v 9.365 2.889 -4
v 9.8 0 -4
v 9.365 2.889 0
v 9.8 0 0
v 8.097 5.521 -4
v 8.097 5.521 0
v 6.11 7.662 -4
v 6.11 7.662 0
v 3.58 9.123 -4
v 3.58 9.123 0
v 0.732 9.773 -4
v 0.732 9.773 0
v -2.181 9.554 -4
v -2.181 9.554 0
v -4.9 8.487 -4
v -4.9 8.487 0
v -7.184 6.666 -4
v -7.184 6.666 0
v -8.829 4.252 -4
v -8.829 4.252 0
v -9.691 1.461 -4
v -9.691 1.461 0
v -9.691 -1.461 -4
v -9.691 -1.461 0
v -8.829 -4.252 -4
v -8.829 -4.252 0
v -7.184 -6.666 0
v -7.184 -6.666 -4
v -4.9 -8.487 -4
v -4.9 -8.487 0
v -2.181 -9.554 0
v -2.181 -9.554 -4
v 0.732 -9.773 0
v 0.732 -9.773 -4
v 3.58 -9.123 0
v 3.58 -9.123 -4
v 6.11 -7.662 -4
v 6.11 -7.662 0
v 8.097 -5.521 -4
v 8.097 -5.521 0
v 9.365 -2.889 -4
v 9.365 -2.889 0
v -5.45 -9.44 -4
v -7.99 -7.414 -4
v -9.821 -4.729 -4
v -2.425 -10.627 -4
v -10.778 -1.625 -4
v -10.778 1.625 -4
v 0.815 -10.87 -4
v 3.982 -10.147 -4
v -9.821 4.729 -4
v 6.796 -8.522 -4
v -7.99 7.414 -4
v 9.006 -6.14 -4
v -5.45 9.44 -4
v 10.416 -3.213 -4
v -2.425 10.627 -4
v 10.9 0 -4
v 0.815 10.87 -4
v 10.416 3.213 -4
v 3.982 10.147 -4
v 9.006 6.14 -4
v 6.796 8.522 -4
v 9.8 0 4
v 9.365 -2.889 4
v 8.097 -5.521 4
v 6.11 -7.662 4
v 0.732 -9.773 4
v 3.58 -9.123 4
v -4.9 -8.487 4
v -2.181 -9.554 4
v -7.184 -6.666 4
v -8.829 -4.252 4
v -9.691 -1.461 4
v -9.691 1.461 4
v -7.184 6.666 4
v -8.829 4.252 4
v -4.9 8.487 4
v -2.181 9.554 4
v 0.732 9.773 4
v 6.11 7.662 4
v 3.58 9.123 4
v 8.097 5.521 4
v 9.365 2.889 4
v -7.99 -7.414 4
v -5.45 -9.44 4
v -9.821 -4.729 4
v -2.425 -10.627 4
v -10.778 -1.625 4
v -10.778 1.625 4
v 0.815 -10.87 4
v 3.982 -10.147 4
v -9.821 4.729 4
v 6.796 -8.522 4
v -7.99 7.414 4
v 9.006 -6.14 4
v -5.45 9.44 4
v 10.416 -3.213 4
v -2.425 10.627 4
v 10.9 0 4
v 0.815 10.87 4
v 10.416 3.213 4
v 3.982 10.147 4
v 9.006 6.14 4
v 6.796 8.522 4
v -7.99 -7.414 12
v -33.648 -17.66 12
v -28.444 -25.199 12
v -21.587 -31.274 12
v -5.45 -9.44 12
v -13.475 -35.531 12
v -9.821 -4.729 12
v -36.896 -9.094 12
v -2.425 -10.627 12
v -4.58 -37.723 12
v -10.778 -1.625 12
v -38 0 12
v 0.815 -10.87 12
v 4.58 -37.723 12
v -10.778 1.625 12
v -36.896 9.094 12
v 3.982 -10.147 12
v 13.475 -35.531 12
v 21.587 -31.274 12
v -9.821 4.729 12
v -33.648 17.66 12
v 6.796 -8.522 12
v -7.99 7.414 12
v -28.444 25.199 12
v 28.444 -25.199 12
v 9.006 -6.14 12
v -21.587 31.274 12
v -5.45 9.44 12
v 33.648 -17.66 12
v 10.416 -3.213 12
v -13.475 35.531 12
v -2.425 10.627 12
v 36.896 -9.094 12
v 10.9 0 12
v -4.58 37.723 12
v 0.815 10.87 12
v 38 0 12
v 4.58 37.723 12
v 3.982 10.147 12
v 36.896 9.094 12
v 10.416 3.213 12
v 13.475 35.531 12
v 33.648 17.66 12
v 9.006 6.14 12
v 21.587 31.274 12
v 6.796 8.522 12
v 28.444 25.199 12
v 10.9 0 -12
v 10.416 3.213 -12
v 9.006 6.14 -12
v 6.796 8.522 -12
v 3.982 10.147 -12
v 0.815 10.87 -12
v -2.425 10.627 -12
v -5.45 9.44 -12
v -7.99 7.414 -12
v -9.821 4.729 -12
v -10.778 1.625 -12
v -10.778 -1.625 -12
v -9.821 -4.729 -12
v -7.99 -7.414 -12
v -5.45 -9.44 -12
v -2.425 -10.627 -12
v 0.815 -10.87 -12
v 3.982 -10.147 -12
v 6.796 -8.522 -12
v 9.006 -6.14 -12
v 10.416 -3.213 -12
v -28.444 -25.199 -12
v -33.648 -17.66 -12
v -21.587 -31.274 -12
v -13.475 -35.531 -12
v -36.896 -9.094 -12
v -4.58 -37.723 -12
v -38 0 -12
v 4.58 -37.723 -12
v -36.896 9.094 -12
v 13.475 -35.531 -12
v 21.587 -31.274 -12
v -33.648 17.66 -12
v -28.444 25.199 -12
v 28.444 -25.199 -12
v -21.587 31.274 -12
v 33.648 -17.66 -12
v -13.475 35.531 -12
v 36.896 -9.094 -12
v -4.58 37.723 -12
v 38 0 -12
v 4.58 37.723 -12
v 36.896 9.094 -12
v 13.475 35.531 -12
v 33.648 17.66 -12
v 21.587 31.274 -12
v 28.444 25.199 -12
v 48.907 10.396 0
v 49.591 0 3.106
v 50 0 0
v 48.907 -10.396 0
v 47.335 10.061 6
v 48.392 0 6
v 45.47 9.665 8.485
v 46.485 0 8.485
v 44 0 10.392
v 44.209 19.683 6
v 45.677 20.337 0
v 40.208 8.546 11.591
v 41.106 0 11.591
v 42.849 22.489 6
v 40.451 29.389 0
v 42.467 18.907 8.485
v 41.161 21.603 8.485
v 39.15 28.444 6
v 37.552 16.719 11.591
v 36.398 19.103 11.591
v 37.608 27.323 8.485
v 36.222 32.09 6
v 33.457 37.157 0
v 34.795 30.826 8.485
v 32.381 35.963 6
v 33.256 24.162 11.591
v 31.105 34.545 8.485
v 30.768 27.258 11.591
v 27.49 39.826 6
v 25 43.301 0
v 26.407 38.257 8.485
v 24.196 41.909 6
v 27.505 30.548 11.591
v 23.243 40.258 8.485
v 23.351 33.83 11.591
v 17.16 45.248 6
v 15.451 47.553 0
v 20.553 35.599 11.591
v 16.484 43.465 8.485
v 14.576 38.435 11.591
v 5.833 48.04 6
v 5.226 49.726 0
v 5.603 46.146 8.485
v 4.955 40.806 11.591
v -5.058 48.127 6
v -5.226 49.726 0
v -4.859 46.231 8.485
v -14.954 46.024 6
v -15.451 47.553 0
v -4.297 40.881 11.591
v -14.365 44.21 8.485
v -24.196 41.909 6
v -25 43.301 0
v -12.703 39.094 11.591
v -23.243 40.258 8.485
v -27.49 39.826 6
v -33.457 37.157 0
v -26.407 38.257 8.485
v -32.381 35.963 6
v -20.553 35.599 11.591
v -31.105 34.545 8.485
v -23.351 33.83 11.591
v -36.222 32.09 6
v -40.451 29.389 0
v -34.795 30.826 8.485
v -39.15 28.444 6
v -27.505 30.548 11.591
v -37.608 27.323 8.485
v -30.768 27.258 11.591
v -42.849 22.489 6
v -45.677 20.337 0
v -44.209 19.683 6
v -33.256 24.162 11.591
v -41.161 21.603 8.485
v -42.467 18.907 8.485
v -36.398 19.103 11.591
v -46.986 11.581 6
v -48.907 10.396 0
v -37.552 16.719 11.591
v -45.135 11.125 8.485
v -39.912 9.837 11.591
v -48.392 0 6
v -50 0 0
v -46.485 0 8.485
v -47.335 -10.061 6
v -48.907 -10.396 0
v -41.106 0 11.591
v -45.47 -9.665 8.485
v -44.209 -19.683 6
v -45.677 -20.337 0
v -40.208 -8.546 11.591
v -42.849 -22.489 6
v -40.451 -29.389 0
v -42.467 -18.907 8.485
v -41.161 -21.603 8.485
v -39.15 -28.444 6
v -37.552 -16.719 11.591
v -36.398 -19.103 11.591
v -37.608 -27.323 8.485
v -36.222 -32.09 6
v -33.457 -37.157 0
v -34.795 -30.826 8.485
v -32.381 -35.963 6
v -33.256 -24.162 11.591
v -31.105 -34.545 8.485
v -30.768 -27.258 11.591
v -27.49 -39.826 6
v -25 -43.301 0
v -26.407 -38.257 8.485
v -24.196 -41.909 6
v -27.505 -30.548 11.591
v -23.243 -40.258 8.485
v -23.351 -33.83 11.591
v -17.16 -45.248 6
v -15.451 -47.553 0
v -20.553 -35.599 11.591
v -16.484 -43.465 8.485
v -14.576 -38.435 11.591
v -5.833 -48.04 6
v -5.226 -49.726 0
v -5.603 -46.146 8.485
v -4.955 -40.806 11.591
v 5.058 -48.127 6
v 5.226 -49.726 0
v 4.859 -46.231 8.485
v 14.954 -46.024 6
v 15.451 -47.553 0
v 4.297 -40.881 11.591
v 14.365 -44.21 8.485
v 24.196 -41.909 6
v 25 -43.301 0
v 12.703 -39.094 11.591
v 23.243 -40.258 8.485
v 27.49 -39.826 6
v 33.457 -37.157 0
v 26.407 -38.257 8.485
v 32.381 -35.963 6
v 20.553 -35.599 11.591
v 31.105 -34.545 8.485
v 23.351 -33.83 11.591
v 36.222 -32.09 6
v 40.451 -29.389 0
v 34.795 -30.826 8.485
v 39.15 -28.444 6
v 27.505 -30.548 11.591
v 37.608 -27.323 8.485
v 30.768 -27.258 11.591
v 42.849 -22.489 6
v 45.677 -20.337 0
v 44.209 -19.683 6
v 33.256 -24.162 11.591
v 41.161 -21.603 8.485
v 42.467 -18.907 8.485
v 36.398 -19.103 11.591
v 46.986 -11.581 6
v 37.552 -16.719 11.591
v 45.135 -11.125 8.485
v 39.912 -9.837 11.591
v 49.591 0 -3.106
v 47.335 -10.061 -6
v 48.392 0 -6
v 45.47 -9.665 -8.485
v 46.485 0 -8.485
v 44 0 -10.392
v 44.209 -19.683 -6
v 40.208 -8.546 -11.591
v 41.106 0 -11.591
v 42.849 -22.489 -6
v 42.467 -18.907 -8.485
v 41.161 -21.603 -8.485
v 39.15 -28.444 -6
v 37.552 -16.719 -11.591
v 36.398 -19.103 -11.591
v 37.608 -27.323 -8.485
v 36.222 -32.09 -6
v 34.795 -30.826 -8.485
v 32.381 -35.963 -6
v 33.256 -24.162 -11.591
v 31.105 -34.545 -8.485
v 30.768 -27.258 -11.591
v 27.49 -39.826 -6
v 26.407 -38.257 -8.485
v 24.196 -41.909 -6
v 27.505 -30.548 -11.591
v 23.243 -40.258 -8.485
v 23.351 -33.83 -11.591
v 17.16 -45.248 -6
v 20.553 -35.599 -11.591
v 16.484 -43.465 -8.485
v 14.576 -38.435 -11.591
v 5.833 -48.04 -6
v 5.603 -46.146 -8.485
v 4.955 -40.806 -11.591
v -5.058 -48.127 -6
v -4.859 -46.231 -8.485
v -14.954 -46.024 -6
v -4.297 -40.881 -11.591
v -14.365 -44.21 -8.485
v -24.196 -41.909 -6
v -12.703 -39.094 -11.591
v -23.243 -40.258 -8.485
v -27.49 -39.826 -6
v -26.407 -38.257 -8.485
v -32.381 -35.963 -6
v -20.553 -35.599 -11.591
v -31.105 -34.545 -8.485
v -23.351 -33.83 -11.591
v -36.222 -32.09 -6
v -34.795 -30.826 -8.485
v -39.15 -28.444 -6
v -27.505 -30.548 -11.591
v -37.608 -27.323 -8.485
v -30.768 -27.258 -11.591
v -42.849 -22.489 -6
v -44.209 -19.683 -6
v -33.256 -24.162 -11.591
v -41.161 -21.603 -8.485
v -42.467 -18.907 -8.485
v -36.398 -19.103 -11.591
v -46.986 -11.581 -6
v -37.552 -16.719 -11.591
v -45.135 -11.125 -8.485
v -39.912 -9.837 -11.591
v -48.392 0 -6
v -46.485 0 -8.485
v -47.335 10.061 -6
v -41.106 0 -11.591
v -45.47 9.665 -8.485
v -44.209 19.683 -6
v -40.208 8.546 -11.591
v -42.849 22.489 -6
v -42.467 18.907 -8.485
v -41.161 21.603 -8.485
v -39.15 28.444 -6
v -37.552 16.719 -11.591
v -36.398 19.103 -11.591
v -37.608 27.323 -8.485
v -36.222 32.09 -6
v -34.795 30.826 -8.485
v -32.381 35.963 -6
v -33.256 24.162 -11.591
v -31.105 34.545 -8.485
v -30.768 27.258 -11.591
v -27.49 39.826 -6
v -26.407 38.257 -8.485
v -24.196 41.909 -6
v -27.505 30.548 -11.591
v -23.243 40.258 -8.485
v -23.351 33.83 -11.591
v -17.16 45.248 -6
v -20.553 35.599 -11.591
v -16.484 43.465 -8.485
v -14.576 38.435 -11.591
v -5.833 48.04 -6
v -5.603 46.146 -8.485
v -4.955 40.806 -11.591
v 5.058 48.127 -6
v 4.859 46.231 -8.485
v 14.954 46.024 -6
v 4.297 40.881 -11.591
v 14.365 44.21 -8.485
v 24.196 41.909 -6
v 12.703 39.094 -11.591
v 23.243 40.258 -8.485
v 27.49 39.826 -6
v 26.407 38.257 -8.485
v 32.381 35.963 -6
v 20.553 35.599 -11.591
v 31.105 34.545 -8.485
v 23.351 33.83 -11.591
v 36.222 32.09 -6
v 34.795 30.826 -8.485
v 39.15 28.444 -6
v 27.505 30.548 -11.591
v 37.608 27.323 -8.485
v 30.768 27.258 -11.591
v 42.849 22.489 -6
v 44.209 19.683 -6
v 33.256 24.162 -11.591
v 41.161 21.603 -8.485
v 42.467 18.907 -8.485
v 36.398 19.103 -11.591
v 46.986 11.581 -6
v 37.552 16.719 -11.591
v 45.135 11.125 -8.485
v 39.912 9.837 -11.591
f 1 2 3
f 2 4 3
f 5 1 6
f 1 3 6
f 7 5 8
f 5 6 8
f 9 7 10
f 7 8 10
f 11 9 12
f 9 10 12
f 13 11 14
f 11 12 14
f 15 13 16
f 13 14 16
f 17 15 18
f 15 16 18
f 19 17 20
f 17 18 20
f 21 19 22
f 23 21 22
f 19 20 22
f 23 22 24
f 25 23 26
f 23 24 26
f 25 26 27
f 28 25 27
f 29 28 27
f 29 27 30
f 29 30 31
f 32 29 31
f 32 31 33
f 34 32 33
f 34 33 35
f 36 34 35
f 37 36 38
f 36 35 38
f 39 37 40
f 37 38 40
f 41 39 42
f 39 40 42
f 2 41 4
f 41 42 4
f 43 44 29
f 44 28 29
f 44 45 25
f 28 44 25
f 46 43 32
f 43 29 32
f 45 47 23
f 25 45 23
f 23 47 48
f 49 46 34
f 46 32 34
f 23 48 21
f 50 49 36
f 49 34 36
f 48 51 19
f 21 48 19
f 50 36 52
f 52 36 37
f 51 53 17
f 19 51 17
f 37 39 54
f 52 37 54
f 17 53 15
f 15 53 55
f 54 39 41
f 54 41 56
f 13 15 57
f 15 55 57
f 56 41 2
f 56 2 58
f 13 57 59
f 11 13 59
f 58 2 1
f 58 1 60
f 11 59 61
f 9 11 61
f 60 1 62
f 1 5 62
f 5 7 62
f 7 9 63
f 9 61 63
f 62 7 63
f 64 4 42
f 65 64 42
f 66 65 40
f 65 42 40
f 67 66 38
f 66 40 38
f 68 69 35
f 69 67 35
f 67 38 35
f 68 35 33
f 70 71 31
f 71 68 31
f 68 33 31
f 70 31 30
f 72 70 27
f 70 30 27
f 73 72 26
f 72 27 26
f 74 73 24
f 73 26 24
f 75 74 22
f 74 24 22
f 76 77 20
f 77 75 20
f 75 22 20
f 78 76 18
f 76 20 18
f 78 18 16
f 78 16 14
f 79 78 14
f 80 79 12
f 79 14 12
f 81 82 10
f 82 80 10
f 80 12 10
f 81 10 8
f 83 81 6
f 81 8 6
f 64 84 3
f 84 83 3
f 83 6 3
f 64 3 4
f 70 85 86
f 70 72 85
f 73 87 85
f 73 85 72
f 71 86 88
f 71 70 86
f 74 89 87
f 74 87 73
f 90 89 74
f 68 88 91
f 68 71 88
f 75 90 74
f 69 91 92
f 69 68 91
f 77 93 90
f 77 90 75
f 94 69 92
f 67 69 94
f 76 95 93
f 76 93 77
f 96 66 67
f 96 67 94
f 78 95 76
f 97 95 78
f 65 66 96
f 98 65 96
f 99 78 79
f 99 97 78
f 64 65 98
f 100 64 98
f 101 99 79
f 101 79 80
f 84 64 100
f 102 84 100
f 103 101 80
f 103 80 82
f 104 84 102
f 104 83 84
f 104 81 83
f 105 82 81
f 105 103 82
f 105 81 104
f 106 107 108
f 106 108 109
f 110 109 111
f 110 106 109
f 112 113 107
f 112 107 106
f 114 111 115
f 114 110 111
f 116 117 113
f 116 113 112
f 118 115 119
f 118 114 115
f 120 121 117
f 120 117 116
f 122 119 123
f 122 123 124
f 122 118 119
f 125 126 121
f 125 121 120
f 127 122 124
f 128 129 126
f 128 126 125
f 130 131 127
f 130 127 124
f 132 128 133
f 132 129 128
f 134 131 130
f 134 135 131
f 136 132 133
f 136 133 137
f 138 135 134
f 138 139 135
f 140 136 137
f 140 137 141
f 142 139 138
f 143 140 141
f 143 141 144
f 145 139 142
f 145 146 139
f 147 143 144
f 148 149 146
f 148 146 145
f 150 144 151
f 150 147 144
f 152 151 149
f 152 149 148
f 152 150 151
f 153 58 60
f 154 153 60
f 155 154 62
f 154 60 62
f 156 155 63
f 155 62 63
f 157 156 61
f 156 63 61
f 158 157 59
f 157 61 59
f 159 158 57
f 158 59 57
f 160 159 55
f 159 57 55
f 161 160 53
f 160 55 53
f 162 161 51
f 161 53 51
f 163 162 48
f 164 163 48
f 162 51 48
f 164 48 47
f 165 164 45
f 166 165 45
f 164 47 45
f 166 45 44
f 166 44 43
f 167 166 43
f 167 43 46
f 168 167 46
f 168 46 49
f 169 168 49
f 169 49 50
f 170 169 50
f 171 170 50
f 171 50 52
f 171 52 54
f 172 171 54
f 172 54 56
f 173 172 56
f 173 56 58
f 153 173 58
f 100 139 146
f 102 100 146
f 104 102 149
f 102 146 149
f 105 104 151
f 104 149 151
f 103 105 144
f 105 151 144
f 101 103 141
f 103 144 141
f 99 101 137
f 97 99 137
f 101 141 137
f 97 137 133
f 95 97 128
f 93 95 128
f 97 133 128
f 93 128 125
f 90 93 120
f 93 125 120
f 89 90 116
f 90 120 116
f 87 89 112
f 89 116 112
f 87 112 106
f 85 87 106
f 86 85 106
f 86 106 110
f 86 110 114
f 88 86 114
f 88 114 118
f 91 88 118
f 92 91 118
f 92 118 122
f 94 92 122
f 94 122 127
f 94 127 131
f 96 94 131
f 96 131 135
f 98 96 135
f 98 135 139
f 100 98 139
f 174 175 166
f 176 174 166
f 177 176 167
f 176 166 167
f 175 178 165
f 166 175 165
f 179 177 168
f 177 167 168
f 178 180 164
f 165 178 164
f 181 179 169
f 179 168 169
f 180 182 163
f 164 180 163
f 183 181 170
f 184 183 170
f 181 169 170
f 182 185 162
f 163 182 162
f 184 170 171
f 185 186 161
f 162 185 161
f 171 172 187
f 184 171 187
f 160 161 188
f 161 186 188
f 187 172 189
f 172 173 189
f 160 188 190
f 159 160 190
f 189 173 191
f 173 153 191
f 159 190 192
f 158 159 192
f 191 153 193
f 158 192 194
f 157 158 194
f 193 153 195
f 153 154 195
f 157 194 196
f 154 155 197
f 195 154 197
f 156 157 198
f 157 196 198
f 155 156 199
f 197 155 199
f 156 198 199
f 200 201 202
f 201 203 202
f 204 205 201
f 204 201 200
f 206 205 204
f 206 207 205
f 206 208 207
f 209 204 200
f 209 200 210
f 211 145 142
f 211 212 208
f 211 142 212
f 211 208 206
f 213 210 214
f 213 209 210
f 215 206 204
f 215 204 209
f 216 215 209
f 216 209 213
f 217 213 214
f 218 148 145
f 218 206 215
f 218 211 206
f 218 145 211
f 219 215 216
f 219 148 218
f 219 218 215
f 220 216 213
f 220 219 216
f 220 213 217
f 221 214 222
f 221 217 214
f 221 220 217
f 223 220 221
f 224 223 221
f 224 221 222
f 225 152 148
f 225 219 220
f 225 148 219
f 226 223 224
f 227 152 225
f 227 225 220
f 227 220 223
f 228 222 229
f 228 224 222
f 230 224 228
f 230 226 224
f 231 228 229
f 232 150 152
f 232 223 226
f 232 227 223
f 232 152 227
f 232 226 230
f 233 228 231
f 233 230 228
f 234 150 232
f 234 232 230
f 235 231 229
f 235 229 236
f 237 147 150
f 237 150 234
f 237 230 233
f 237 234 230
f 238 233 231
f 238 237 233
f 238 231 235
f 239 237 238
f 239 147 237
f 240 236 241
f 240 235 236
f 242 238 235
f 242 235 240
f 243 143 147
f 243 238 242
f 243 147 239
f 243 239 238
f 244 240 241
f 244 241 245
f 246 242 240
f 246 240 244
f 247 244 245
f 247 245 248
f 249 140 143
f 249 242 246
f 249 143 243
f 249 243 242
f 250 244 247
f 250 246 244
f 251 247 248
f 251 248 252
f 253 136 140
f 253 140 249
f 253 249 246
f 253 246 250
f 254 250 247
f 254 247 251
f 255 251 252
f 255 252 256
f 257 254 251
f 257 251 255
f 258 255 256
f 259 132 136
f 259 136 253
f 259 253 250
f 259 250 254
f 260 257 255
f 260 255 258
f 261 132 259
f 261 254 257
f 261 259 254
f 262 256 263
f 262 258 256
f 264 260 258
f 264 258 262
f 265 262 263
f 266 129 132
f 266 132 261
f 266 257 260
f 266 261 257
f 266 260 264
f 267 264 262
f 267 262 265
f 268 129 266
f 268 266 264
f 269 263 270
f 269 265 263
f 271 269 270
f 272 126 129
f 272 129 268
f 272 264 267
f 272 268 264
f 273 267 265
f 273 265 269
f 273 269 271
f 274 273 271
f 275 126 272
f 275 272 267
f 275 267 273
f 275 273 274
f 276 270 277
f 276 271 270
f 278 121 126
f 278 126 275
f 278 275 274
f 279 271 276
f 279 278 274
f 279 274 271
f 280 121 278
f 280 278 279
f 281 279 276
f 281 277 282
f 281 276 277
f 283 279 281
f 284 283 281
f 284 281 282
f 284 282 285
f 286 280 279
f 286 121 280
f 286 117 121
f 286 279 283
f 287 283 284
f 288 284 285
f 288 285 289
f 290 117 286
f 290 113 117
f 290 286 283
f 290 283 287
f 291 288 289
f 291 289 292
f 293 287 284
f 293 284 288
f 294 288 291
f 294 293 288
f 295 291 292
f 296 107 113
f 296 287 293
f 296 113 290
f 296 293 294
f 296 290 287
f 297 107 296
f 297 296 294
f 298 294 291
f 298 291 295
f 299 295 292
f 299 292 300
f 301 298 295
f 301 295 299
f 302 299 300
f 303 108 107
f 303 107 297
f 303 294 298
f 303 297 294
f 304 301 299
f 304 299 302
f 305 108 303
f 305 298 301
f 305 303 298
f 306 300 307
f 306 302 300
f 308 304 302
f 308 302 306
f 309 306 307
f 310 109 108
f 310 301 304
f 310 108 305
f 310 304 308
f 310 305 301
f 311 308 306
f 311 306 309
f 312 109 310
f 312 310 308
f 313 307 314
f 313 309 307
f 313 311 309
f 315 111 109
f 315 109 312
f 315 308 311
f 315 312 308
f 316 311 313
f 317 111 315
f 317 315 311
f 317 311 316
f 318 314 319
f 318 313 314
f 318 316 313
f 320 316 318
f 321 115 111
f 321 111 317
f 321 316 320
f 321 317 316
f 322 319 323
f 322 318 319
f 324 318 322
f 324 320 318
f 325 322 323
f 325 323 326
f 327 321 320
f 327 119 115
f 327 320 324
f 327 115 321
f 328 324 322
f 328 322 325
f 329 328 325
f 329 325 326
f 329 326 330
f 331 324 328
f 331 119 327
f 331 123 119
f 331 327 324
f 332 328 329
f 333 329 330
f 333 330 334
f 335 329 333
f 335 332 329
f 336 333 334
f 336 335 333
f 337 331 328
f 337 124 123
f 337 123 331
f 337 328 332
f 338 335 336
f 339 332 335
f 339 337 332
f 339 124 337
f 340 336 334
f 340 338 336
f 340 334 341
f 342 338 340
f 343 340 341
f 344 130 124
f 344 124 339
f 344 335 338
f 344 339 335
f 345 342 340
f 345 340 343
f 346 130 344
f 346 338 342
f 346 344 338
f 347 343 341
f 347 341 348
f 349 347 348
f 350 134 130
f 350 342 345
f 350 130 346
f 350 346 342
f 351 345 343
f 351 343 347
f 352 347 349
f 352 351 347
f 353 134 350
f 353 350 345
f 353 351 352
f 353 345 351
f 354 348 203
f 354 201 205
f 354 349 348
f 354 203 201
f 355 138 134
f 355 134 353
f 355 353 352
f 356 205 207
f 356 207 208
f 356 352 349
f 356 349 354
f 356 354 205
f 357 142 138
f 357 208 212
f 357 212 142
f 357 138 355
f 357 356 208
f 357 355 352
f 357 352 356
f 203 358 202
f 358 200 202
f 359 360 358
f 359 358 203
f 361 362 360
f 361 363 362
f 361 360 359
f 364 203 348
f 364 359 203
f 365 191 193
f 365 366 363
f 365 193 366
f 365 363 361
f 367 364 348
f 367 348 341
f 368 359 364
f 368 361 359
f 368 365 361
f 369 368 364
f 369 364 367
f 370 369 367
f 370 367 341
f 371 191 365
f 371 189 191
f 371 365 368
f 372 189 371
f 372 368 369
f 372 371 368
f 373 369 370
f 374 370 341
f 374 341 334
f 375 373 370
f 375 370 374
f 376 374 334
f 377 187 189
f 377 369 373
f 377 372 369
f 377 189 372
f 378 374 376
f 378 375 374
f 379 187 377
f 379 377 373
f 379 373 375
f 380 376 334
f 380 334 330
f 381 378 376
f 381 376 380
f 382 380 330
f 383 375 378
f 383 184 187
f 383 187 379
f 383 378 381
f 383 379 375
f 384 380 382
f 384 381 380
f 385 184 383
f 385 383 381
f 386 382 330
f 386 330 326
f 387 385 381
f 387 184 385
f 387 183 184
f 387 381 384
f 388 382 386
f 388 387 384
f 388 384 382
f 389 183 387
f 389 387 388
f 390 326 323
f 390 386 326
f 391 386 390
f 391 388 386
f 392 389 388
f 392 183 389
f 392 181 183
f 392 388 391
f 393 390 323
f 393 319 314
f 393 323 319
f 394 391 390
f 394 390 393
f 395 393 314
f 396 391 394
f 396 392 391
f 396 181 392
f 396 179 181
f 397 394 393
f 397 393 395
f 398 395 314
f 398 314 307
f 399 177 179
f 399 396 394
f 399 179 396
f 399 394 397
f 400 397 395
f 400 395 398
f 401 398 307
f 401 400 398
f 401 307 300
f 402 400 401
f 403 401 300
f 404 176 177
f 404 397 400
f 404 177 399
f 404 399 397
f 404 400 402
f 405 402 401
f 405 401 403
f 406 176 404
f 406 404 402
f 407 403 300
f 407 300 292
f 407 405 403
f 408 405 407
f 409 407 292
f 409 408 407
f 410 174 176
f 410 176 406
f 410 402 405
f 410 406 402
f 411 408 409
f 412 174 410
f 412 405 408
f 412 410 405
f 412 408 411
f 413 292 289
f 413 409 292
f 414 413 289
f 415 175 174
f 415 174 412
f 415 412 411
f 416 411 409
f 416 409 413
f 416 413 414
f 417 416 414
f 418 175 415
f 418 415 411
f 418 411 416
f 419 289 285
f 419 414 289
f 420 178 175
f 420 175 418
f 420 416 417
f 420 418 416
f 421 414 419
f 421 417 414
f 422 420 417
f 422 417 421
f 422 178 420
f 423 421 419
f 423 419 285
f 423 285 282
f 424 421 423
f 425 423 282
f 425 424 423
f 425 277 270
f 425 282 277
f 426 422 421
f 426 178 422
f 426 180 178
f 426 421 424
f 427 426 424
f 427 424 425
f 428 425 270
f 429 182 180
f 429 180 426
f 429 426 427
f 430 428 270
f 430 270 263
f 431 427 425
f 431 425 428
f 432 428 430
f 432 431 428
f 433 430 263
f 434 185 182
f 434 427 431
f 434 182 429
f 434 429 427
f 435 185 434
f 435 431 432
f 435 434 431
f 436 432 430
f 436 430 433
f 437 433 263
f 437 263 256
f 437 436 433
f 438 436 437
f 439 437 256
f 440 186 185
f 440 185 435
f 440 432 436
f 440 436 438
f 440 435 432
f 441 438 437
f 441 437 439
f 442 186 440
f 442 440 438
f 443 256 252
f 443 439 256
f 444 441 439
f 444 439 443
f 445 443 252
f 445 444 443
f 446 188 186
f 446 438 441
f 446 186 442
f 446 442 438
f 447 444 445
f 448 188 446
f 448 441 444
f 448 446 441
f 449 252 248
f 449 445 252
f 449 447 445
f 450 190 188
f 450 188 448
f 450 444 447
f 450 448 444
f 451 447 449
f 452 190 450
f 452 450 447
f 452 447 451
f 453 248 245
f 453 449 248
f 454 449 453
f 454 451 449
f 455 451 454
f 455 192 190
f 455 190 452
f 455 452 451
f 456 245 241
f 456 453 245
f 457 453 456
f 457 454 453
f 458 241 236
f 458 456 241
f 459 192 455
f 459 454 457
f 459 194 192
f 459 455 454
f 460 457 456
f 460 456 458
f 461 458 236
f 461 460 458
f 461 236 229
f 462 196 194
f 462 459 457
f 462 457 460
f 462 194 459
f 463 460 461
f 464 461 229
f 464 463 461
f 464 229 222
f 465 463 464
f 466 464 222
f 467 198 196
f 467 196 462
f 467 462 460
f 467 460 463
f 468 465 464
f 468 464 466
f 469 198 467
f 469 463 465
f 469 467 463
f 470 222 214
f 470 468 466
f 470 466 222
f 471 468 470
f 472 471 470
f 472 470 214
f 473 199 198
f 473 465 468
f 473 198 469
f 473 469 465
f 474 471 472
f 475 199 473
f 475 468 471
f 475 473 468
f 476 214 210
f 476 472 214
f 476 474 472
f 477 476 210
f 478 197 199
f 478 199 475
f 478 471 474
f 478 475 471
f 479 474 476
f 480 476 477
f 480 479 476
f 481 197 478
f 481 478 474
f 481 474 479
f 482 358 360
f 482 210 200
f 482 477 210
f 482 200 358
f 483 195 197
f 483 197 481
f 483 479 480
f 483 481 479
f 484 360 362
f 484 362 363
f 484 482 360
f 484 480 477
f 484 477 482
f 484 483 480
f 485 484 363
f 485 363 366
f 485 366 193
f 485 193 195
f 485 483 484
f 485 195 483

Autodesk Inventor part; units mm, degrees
ref_plane "YZ Plane" through (0, 0, 0) normal (1, 0, 0) x (0, 1, 0)
ref_plane "XZ Plane" through (0, 0, 0) normal (0, 1, 0) x (-1, 0, 0)
ref_plane "XY Plane" through (0, 0, 0) normal (0, 0, 1) x (1, 0, 0)
sketch "Sketch1" plane through (0, 0, 0) normal (0, 0, 1) x (1, 0, 0)
  circle A0 centre (0, 0) radius 50
  dimension "d0" = 100
extrude "Extrusion1" add sketch "Sketch1" along normal mid plane 24
fillet "Fillet1" radius 12 2 edges at (-50, 0, 12) (-50, 0, -12)
sketch "Sketch2" plane through (0, 0, 12) normal (0, 0, 1) x (1, 0, 0)
  point P0 (0, 0)
sketch "Sketch3" plane through (0, 0, 12) normal (0, 0, 1) x (1, 0, 0)
  circle A0 centre (0, 0) radius 10.9
  dimension "d4" = 21.8
extrude "Extrusion2" cut sketch "Sketch3" against normal through all
sketch "Sketch4" plane through (0, 0, 0) normal (0, 0, 1) x (1, 0, 0)
  circle A0 centre (0, 0) radius 9.8
  circle A1 centre (0, 0) radius 10.9
  circle A2 centre (0, 0) radius 10.9 projected
  dimension "d7" = 19.6
extrude "Extrusion4" add sketch "Sketch4" along normal mid plane 8
properties part number "WHEEL" material "Rubber"
